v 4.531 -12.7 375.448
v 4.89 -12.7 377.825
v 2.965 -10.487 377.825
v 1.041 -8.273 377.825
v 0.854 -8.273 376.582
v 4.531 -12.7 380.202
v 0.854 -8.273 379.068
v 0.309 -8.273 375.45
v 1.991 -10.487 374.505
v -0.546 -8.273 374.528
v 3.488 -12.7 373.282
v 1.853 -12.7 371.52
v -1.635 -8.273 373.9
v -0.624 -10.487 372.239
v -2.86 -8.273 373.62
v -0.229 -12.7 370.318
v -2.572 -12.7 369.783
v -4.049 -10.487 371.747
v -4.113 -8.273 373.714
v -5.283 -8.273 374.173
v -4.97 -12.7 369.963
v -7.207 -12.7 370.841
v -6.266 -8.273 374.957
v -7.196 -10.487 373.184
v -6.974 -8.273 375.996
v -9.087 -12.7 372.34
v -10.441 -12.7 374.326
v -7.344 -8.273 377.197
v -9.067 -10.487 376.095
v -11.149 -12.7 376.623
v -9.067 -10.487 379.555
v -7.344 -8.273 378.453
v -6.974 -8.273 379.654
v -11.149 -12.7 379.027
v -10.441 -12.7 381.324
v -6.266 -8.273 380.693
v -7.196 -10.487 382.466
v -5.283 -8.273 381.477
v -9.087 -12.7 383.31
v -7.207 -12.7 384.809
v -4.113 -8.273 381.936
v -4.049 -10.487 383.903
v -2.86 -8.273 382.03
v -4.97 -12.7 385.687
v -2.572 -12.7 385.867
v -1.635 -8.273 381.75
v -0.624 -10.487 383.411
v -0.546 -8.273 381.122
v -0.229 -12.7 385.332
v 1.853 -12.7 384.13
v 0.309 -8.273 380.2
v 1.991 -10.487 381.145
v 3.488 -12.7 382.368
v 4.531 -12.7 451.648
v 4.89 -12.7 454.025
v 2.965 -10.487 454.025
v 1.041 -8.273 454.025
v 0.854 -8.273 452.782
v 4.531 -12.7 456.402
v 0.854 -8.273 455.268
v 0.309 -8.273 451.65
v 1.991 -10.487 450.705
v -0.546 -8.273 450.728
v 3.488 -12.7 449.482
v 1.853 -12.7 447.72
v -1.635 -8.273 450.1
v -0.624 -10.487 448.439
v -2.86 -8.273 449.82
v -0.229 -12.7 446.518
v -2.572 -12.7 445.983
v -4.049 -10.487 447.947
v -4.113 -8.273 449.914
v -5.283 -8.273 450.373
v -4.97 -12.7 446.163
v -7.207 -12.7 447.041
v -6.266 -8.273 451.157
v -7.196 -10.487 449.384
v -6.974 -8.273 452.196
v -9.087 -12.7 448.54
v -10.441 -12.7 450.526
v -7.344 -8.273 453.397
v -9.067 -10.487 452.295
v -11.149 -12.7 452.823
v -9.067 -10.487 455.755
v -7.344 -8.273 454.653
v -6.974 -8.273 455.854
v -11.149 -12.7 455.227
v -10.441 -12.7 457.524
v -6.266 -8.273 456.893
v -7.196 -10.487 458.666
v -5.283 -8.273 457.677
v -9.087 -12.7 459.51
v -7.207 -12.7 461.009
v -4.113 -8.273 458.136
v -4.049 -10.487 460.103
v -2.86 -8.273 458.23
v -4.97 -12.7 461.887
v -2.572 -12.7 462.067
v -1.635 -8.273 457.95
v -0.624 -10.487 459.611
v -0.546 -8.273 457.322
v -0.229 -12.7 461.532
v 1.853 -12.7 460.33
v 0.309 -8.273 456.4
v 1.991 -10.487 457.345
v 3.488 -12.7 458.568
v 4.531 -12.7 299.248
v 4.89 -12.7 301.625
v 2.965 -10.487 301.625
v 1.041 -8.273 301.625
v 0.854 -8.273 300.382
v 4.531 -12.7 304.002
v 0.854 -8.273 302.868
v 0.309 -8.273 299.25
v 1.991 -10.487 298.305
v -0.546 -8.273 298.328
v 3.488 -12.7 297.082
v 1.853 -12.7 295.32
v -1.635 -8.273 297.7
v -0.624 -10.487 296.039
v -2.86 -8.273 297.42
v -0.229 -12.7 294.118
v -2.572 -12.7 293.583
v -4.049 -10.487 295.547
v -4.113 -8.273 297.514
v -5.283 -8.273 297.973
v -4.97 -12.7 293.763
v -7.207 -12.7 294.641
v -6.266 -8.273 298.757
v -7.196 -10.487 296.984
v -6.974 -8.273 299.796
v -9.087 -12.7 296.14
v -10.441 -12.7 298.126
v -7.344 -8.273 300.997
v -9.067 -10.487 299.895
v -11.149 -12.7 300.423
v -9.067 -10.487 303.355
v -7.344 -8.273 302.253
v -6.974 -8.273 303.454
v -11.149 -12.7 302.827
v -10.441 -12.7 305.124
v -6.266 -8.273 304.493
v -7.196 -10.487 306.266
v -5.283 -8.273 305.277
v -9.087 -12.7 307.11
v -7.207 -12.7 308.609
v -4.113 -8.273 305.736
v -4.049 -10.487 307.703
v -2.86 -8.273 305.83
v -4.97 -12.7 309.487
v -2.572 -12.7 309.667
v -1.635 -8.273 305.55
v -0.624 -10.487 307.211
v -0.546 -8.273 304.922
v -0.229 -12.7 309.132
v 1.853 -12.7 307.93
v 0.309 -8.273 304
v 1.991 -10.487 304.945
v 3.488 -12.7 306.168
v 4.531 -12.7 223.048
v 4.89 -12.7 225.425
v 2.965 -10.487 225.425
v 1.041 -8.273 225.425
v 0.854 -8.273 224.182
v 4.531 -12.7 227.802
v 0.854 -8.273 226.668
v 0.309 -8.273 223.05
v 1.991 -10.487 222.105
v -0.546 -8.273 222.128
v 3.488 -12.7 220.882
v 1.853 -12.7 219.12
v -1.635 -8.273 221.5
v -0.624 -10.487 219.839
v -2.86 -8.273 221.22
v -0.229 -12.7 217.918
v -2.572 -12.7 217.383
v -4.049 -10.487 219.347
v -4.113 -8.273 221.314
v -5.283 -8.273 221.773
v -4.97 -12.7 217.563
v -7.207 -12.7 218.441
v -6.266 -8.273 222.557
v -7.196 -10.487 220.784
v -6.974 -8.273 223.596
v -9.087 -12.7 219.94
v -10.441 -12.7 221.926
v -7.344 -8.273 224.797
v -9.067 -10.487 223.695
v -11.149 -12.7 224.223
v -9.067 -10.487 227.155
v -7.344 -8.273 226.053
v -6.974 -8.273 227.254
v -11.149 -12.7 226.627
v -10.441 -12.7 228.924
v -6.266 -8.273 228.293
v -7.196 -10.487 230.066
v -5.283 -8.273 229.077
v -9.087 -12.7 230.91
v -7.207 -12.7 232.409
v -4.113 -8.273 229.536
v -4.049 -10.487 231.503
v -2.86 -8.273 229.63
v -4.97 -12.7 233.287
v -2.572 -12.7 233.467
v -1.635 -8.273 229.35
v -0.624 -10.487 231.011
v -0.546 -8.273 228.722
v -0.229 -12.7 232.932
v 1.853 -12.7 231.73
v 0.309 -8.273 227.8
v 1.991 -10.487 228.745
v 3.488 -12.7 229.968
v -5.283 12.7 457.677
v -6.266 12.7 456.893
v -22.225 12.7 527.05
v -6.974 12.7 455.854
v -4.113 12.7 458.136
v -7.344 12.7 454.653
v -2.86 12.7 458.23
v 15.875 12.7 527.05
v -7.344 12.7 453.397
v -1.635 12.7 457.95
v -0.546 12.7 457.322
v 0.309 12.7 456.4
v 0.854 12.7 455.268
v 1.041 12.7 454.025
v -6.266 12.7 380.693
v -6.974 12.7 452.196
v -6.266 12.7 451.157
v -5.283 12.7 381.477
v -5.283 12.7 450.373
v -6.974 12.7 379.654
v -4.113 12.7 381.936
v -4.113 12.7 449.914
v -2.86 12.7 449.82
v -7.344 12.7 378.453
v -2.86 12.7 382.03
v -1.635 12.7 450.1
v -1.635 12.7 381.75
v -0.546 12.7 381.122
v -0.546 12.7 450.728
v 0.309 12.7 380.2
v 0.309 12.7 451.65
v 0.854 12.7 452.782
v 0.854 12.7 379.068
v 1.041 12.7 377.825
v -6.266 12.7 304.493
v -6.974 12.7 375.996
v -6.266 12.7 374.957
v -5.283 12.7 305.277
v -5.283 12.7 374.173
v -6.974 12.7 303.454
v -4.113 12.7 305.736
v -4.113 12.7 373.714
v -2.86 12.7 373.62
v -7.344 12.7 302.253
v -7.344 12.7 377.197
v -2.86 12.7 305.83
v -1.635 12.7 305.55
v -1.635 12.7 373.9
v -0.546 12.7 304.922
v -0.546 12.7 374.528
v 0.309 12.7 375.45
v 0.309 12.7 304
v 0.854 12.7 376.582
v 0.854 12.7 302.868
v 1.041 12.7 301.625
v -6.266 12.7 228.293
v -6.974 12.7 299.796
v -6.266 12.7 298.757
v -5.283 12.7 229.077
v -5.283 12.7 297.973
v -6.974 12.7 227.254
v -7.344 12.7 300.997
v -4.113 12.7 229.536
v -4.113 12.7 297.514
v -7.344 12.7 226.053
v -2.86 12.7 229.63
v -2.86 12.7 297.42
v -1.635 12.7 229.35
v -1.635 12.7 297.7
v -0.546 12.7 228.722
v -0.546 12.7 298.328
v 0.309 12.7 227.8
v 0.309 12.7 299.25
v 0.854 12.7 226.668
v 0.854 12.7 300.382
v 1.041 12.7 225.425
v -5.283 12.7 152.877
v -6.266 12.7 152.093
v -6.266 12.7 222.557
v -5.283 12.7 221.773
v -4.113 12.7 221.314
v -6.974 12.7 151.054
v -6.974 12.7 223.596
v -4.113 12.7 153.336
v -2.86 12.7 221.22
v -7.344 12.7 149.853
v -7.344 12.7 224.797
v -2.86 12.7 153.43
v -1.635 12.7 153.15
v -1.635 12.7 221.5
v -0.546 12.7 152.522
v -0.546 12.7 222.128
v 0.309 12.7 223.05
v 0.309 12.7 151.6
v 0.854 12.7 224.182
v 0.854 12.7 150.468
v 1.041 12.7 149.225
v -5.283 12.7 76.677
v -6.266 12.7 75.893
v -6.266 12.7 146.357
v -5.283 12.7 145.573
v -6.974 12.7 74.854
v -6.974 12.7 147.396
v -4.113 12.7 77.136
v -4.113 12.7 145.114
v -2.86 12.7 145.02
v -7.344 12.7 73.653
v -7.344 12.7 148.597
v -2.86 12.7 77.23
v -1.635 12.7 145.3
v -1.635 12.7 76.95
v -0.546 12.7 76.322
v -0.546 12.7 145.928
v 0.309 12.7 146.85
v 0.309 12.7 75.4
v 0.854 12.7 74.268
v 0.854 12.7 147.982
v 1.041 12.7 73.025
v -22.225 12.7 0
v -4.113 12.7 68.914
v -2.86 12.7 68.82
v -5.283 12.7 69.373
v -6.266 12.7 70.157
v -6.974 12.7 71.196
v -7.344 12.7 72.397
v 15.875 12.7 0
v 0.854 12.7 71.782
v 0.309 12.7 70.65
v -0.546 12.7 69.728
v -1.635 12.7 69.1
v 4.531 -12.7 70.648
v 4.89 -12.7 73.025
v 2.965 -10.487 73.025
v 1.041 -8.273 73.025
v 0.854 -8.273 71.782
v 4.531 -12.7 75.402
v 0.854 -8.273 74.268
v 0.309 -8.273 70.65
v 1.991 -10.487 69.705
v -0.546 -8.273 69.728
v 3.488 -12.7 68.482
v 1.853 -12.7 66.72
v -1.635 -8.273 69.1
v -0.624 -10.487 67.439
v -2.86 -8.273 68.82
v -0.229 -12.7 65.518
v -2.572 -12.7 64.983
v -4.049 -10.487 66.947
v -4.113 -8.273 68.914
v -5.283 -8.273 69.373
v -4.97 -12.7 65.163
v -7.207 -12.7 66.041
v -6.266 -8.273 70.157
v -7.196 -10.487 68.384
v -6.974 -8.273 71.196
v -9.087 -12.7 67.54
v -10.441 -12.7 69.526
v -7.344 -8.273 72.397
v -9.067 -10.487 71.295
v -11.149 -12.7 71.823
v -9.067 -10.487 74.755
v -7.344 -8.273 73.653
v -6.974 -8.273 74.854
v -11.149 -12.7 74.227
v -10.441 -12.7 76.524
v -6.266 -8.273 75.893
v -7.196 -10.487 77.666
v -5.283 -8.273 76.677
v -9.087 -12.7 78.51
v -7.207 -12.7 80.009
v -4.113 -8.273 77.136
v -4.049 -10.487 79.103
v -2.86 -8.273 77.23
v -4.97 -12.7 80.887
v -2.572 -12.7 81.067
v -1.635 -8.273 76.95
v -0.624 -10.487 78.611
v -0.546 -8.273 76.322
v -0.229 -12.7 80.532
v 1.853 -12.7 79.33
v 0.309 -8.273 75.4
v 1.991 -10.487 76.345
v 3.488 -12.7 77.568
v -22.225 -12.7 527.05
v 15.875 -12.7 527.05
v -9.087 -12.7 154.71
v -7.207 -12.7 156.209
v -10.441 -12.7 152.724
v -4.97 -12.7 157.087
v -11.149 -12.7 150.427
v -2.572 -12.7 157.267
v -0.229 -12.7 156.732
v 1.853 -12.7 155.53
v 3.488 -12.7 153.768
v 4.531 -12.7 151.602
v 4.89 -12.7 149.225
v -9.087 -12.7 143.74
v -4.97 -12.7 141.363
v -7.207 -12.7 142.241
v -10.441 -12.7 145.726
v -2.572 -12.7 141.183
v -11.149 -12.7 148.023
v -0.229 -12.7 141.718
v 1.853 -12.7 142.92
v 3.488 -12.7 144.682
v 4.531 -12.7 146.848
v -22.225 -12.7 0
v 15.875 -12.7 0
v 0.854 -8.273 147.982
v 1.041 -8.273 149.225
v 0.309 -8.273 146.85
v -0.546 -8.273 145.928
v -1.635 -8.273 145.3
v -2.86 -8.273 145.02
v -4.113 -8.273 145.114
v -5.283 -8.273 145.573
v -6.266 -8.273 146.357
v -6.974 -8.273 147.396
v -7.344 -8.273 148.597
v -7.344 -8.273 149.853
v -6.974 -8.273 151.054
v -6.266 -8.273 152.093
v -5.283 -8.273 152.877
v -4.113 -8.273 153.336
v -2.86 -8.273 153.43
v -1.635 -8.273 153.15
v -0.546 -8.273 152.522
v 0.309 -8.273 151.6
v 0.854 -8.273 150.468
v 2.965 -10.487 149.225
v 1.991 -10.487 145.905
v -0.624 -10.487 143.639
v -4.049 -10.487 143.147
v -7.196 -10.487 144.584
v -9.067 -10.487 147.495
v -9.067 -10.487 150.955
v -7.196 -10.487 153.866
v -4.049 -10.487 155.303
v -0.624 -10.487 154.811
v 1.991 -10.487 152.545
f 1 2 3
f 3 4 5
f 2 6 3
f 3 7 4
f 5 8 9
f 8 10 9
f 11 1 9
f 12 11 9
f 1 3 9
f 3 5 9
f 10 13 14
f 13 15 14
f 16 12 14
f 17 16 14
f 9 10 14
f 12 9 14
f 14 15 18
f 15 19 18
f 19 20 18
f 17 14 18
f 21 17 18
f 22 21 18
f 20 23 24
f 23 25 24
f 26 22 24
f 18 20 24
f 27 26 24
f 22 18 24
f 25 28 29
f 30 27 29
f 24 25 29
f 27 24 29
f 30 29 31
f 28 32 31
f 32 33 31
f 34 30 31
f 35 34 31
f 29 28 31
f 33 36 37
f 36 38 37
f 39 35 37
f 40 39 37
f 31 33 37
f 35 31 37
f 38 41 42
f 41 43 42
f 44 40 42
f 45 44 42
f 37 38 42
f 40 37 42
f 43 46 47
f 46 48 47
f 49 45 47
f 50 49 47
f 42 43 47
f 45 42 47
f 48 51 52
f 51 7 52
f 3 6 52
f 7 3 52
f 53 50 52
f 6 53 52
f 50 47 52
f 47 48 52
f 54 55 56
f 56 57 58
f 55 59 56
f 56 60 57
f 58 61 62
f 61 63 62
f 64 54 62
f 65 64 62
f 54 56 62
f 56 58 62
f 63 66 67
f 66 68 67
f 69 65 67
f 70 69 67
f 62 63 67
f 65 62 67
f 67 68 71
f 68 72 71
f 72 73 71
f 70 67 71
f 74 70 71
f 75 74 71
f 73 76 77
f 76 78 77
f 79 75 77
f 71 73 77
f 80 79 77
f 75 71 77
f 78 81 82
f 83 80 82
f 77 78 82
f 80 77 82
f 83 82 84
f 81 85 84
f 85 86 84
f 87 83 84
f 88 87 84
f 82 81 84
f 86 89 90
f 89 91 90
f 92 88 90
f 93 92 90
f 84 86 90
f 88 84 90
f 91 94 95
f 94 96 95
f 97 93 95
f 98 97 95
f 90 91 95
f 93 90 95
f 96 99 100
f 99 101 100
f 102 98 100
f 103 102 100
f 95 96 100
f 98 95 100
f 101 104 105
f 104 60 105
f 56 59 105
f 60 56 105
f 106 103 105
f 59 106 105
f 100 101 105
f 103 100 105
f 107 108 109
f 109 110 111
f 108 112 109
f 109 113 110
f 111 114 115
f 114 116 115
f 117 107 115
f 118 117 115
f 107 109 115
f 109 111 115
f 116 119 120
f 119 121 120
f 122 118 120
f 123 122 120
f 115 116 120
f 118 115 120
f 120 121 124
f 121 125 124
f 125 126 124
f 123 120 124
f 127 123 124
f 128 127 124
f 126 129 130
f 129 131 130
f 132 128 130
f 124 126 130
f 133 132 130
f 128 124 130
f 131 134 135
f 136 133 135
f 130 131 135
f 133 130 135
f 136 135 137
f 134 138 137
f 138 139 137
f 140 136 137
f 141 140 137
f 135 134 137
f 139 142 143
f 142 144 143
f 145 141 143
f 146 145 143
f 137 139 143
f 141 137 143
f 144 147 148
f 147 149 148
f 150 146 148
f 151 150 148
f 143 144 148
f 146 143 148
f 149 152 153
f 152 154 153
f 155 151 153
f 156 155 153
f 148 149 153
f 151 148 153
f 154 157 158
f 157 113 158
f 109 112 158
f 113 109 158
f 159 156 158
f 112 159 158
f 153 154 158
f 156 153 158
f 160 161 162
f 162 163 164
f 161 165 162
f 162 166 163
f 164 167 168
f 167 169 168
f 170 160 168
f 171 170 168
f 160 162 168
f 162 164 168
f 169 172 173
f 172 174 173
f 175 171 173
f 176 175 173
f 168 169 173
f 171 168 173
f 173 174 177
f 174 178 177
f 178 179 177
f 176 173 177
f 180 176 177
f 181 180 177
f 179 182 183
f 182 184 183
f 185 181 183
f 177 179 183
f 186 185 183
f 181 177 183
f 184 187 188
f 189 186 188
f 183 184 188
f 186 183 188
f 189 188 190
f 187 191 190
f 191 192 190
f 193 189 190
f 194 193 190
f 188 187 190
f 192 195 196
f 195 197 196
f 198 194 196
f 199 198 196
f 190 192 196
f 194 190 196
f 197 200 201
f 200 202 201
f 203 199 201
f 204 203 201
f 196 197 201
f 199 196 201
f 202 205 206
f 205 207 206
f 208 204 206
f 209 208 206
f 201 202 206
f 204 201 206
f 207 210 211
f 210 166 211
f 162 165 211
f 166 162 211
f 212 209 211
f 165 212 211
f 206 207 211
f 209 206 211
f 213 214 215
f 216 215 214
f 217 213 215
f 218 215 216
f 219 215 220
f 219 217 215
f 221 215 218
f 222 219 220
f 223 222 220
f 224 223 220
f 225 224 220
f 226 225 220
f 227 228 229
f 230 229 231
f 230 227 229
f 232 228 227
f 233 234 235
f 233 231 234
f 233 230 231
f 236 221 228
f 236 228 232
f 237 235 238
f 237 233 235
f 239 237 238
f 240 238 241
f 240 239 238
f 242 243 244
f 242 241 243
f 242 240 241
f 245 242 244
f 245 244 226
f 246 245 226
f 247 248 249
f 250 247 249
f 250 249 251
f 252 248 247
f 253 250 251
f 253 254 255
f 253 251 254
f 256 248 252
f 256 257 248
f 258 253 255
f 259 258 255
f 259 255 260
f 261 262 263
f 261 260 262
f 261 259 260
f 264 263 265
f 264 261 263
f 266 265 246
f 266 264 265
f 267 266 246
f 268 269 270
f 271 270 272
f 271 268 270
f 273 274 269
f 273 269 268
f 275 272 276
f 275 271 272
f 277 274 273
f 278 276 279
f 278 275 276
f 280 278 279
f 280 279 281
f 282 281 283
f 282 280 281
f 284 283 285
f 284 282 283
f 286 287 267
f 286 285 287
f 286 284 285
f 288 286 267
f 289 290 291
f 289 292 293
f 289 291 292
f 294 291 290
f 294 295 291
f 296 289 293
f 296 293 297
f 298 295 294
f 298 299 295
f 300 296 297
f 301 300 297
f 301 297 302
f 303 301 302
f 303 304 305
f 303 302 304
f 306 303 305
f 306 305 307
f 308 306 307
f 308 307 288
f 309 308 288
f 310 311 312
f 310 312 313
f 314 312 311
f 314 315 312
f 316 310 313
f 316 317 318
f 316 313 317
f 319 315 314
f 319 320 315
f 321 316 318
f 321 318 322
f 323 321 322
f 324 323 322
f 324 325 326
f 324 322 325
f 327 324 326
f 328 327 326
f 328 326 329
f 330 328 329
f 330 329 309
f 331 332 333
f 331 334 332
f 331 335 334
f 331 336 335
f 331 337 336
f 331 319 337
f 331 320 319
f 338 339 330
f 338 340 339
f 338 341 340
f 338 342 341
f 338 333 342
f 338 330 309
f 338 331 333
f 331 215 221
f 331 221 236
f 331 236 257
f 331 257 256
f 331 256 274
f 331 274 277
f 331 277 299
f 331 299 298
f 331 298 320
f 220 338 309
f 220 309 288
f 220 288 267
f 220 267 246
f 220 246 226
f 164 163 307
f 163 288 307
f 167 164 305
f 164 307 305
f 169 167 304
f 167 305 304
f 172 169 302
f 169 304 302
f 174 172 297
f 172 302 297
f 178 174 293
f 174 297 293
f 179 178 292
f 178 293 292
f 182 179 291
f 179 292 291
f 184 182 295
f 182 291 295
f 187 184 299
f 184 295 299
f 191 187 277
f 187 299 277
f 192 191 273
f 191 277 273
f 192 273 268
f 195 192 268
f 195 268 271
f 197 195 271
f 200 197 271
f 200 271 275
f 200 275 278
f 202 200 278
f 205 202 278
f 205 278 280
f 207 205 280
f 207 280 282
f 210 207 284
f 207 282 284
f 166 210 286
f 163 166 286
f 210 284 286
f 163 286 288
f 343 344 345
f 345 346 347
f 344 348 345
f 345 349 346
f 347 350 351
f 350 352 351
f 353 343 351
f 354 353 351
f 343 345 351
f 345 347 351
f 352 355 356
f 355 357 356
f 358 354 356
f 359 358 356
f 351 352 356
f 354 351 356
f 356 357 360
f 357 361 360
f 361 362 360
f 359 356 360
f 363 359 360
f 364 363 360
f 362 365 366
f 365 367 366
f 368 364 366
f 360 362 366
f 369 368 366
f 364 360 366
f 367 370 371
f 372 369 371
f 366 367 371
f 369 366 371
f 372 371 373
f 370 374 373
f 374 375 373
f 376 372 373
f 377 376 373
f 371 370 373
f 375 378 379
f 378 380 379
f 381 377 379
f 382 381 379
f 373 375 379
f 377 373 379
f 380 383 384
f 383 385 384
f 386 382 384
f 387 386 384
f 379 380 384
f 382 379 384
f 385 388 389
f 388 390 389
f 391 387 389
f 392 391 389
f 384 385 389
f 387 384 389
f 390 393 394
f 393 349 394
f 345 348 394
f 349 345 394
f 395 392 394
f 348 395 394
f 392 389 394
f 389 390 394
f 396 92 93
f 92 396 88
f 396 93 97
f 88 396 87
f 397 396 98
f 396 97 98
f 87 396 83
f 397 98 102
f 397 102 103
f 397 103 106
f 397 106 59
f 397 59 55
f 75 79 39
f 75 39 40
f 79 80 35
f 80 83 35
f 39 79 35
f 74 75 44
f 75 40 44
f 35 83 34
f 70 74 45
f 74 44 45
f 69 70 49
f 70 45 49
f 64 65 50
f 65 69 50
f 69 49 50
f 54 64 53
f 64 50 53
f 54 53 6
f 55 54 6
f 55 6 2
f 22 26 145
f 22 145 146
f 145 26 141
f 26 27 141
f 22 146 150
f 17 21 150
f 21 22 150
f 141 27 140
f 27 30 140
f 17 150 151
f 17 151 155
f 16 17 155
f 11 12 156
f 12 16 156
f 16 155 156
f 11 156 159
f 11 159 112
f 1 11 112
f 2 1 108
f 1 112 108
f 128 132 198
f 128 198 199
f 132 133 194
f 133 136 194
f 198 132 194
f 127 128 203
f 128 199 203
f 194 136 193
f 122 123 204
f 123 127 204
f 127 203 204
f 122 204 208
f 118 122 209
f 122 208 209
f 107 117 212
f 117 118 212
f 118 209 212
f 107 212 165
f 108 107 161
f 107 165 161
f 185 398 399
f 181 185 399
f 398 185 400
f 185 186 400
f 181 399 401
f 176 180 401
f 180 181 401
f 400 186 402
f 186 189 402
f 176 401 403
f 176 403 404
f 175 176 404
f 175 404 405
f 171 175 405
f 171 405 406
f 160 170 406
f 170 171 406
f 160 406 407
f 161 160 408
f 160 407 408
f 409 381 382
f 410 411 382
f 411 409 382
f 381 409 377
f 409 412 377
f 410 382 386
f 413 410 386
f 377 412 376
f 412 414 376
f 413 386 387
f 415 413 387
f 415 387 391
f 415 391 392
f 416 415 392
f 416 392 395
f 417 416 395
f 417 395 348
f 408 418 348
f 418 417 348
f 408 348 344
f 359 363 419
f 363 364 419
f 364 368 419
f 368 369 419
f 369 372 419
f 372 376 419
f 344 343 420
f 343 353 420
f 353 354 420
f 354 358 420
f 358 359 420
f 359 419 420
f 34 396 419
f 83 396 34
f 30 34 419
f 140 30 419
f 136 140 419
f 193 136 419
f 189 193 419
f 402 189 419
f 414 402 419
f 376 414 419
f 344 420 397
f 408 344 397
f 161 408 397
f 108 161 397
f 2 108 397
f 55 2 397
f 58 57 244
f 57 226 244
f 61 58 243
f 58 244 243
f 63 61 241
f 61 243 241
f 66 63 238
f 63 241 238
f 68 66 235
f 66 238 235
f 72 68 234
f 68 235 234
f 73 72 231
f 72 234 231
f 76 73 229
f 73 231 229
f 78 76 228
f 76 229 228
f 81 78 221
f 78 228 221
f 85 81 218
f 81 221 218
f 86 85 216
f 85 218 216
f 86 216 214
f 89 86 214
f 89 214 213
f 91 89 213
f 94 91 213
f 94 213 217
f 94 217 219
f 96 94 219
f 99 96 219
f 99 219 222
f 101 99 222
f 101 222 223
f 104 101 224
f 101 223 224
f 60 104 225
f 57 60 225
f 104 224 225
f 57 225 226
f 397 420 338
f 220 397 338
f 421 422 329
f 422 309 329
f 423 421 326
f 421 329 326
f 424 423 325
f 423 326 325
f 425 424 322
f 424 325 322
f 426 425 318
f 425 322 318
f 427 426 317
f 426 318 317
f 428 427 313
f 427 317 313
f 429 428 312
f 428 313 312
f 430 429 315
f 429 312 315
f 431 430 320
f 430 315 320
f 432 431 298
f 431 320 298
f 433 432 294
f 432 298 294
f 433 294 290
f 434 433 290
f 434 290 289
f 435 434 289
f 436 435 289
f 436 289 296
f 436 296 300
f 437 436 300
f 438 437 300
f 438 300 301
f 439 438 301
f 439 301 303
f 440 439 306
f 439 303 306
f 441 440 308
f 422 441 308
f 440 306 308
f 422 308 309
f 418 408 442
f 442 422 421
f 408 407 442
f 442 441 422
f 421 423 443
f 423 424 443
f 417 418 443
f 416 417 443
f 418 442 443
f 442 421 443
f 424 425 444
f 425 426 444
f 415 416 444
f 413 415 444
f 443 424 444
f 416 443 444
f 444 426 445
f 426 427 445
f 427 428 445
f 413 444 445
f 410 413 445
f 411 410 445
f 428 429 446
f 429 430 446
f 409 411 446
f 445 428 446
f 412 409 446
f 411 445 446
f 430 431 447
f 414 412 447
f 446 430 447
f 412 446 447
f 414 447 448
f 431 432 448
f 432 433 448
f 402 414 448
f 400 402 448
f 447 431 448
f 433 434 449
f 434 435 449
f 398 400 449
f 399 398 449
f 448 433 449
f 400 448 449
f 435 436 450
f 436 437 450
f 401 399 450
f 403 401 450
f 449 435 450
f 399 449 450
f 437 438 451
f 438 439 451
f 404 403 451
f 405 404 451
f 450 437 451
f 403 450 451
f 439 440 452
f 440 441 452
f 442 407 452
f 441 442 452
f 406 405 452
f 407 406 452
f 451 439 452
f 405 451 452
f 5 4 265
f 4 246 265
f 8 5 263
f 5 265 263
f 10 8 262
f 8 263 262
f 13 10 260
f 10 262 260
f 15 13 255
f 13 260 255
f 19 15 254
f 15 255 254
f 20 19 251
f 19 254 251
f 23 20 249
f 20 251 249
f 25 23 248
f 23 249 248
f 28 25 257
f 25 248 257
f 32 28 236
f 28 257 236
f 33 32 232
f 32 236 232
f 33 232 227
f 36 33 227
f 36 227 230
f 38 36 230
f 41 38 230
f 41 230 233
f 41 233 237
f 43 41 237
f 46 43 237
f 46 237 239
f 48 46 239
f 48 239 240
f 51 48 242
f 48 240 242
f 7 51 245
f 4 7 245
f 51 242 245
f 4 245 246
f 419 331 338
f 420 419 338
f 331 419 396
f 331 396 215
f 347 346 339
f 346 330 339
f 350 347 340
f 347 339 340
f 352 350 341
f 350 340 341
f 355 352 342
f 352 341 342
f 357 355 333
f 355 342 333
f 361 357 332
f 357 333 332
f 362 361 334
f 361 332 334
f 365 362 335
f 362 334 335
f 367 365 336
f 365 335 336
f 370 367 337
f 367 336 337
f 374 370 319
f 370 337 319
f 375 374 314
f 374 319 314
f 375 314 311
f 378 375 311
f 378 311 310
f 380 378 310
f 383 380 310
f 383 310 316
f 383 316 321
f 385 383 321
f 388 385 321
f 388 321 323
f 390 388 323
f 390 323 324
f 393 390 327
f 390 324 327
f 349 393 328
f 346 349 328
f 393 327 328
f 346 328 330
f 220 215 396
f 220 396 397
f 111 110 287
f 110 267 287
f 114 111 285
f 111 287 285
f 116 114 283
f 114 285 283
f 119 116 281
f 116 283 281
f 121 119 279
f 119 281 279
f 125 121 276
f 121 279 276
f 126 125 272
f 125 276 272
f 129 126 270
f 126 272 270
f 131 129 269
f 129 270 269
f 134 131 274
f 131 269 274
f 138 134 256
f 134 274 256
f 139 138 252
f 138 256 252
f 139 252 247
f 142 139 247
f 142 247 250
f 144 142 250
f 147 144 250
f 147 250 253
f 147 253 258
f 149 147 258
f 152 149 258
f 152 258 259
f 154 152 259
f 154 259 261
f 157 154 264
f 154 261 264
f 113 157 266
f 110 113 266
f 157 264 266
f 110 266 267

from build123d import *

# Parameters (mm, degrees)
SKETCH1_W                                         = 38.1
SKETCH1_H                                         = 25.4
BOSS_EXTRUDE1_DEPTH                               = 527.05
CSK_FOR_5_16_FLAT_HEAD_MACHINE_SCREW1_D           = 8.4328
CSK_FOR_5_16_FLAT_HEAD_MACHINE_SCREW1_CSINK_D     = 16.129
CSK_FOR_5_16_FLAT_HEAD_MACHINE_SCREW1_CSINK_ANGLE = 82


with BuildPart() as part:
    # Sketch1 → Boss-Extrude1 (new body)
    with BuildSketch(Plane.XY):
        with Locations((-3.175, 0)):
            Rectangle(SKETCH1_W, SKETCH1_H)
    extrude(amount=BOSS_EXTRUDE1_DEPTH)

    # CSK for 5/16 Flat Head Machine Screw1 (through all)
    with Locations(Plane(origin=(0, -12.7, 0), x_dir=(-1, 0, 0), z_dir=(0, -1, 0))):
        with Locations((3.175, -454.025), (3.175, -377.825), (3.175, -301.625), (3.175, -225.425), (3.175, -149.225), (3.175, -73.025)):
            CounterSinkHole(CSK_FOR_5_16_FLAT_HEAD_MACHINE_SCREW1_D / 2, CSK_FOR_5_16_FLAT_HEAD_MACHINE_SCREW1_CSINK_D / 2, counter_sink_angle=CSK_FOR_5_16_FLAT_HEAD_MACHINE_SCREW1_CSINK_ANGLE)


solid = part.part
